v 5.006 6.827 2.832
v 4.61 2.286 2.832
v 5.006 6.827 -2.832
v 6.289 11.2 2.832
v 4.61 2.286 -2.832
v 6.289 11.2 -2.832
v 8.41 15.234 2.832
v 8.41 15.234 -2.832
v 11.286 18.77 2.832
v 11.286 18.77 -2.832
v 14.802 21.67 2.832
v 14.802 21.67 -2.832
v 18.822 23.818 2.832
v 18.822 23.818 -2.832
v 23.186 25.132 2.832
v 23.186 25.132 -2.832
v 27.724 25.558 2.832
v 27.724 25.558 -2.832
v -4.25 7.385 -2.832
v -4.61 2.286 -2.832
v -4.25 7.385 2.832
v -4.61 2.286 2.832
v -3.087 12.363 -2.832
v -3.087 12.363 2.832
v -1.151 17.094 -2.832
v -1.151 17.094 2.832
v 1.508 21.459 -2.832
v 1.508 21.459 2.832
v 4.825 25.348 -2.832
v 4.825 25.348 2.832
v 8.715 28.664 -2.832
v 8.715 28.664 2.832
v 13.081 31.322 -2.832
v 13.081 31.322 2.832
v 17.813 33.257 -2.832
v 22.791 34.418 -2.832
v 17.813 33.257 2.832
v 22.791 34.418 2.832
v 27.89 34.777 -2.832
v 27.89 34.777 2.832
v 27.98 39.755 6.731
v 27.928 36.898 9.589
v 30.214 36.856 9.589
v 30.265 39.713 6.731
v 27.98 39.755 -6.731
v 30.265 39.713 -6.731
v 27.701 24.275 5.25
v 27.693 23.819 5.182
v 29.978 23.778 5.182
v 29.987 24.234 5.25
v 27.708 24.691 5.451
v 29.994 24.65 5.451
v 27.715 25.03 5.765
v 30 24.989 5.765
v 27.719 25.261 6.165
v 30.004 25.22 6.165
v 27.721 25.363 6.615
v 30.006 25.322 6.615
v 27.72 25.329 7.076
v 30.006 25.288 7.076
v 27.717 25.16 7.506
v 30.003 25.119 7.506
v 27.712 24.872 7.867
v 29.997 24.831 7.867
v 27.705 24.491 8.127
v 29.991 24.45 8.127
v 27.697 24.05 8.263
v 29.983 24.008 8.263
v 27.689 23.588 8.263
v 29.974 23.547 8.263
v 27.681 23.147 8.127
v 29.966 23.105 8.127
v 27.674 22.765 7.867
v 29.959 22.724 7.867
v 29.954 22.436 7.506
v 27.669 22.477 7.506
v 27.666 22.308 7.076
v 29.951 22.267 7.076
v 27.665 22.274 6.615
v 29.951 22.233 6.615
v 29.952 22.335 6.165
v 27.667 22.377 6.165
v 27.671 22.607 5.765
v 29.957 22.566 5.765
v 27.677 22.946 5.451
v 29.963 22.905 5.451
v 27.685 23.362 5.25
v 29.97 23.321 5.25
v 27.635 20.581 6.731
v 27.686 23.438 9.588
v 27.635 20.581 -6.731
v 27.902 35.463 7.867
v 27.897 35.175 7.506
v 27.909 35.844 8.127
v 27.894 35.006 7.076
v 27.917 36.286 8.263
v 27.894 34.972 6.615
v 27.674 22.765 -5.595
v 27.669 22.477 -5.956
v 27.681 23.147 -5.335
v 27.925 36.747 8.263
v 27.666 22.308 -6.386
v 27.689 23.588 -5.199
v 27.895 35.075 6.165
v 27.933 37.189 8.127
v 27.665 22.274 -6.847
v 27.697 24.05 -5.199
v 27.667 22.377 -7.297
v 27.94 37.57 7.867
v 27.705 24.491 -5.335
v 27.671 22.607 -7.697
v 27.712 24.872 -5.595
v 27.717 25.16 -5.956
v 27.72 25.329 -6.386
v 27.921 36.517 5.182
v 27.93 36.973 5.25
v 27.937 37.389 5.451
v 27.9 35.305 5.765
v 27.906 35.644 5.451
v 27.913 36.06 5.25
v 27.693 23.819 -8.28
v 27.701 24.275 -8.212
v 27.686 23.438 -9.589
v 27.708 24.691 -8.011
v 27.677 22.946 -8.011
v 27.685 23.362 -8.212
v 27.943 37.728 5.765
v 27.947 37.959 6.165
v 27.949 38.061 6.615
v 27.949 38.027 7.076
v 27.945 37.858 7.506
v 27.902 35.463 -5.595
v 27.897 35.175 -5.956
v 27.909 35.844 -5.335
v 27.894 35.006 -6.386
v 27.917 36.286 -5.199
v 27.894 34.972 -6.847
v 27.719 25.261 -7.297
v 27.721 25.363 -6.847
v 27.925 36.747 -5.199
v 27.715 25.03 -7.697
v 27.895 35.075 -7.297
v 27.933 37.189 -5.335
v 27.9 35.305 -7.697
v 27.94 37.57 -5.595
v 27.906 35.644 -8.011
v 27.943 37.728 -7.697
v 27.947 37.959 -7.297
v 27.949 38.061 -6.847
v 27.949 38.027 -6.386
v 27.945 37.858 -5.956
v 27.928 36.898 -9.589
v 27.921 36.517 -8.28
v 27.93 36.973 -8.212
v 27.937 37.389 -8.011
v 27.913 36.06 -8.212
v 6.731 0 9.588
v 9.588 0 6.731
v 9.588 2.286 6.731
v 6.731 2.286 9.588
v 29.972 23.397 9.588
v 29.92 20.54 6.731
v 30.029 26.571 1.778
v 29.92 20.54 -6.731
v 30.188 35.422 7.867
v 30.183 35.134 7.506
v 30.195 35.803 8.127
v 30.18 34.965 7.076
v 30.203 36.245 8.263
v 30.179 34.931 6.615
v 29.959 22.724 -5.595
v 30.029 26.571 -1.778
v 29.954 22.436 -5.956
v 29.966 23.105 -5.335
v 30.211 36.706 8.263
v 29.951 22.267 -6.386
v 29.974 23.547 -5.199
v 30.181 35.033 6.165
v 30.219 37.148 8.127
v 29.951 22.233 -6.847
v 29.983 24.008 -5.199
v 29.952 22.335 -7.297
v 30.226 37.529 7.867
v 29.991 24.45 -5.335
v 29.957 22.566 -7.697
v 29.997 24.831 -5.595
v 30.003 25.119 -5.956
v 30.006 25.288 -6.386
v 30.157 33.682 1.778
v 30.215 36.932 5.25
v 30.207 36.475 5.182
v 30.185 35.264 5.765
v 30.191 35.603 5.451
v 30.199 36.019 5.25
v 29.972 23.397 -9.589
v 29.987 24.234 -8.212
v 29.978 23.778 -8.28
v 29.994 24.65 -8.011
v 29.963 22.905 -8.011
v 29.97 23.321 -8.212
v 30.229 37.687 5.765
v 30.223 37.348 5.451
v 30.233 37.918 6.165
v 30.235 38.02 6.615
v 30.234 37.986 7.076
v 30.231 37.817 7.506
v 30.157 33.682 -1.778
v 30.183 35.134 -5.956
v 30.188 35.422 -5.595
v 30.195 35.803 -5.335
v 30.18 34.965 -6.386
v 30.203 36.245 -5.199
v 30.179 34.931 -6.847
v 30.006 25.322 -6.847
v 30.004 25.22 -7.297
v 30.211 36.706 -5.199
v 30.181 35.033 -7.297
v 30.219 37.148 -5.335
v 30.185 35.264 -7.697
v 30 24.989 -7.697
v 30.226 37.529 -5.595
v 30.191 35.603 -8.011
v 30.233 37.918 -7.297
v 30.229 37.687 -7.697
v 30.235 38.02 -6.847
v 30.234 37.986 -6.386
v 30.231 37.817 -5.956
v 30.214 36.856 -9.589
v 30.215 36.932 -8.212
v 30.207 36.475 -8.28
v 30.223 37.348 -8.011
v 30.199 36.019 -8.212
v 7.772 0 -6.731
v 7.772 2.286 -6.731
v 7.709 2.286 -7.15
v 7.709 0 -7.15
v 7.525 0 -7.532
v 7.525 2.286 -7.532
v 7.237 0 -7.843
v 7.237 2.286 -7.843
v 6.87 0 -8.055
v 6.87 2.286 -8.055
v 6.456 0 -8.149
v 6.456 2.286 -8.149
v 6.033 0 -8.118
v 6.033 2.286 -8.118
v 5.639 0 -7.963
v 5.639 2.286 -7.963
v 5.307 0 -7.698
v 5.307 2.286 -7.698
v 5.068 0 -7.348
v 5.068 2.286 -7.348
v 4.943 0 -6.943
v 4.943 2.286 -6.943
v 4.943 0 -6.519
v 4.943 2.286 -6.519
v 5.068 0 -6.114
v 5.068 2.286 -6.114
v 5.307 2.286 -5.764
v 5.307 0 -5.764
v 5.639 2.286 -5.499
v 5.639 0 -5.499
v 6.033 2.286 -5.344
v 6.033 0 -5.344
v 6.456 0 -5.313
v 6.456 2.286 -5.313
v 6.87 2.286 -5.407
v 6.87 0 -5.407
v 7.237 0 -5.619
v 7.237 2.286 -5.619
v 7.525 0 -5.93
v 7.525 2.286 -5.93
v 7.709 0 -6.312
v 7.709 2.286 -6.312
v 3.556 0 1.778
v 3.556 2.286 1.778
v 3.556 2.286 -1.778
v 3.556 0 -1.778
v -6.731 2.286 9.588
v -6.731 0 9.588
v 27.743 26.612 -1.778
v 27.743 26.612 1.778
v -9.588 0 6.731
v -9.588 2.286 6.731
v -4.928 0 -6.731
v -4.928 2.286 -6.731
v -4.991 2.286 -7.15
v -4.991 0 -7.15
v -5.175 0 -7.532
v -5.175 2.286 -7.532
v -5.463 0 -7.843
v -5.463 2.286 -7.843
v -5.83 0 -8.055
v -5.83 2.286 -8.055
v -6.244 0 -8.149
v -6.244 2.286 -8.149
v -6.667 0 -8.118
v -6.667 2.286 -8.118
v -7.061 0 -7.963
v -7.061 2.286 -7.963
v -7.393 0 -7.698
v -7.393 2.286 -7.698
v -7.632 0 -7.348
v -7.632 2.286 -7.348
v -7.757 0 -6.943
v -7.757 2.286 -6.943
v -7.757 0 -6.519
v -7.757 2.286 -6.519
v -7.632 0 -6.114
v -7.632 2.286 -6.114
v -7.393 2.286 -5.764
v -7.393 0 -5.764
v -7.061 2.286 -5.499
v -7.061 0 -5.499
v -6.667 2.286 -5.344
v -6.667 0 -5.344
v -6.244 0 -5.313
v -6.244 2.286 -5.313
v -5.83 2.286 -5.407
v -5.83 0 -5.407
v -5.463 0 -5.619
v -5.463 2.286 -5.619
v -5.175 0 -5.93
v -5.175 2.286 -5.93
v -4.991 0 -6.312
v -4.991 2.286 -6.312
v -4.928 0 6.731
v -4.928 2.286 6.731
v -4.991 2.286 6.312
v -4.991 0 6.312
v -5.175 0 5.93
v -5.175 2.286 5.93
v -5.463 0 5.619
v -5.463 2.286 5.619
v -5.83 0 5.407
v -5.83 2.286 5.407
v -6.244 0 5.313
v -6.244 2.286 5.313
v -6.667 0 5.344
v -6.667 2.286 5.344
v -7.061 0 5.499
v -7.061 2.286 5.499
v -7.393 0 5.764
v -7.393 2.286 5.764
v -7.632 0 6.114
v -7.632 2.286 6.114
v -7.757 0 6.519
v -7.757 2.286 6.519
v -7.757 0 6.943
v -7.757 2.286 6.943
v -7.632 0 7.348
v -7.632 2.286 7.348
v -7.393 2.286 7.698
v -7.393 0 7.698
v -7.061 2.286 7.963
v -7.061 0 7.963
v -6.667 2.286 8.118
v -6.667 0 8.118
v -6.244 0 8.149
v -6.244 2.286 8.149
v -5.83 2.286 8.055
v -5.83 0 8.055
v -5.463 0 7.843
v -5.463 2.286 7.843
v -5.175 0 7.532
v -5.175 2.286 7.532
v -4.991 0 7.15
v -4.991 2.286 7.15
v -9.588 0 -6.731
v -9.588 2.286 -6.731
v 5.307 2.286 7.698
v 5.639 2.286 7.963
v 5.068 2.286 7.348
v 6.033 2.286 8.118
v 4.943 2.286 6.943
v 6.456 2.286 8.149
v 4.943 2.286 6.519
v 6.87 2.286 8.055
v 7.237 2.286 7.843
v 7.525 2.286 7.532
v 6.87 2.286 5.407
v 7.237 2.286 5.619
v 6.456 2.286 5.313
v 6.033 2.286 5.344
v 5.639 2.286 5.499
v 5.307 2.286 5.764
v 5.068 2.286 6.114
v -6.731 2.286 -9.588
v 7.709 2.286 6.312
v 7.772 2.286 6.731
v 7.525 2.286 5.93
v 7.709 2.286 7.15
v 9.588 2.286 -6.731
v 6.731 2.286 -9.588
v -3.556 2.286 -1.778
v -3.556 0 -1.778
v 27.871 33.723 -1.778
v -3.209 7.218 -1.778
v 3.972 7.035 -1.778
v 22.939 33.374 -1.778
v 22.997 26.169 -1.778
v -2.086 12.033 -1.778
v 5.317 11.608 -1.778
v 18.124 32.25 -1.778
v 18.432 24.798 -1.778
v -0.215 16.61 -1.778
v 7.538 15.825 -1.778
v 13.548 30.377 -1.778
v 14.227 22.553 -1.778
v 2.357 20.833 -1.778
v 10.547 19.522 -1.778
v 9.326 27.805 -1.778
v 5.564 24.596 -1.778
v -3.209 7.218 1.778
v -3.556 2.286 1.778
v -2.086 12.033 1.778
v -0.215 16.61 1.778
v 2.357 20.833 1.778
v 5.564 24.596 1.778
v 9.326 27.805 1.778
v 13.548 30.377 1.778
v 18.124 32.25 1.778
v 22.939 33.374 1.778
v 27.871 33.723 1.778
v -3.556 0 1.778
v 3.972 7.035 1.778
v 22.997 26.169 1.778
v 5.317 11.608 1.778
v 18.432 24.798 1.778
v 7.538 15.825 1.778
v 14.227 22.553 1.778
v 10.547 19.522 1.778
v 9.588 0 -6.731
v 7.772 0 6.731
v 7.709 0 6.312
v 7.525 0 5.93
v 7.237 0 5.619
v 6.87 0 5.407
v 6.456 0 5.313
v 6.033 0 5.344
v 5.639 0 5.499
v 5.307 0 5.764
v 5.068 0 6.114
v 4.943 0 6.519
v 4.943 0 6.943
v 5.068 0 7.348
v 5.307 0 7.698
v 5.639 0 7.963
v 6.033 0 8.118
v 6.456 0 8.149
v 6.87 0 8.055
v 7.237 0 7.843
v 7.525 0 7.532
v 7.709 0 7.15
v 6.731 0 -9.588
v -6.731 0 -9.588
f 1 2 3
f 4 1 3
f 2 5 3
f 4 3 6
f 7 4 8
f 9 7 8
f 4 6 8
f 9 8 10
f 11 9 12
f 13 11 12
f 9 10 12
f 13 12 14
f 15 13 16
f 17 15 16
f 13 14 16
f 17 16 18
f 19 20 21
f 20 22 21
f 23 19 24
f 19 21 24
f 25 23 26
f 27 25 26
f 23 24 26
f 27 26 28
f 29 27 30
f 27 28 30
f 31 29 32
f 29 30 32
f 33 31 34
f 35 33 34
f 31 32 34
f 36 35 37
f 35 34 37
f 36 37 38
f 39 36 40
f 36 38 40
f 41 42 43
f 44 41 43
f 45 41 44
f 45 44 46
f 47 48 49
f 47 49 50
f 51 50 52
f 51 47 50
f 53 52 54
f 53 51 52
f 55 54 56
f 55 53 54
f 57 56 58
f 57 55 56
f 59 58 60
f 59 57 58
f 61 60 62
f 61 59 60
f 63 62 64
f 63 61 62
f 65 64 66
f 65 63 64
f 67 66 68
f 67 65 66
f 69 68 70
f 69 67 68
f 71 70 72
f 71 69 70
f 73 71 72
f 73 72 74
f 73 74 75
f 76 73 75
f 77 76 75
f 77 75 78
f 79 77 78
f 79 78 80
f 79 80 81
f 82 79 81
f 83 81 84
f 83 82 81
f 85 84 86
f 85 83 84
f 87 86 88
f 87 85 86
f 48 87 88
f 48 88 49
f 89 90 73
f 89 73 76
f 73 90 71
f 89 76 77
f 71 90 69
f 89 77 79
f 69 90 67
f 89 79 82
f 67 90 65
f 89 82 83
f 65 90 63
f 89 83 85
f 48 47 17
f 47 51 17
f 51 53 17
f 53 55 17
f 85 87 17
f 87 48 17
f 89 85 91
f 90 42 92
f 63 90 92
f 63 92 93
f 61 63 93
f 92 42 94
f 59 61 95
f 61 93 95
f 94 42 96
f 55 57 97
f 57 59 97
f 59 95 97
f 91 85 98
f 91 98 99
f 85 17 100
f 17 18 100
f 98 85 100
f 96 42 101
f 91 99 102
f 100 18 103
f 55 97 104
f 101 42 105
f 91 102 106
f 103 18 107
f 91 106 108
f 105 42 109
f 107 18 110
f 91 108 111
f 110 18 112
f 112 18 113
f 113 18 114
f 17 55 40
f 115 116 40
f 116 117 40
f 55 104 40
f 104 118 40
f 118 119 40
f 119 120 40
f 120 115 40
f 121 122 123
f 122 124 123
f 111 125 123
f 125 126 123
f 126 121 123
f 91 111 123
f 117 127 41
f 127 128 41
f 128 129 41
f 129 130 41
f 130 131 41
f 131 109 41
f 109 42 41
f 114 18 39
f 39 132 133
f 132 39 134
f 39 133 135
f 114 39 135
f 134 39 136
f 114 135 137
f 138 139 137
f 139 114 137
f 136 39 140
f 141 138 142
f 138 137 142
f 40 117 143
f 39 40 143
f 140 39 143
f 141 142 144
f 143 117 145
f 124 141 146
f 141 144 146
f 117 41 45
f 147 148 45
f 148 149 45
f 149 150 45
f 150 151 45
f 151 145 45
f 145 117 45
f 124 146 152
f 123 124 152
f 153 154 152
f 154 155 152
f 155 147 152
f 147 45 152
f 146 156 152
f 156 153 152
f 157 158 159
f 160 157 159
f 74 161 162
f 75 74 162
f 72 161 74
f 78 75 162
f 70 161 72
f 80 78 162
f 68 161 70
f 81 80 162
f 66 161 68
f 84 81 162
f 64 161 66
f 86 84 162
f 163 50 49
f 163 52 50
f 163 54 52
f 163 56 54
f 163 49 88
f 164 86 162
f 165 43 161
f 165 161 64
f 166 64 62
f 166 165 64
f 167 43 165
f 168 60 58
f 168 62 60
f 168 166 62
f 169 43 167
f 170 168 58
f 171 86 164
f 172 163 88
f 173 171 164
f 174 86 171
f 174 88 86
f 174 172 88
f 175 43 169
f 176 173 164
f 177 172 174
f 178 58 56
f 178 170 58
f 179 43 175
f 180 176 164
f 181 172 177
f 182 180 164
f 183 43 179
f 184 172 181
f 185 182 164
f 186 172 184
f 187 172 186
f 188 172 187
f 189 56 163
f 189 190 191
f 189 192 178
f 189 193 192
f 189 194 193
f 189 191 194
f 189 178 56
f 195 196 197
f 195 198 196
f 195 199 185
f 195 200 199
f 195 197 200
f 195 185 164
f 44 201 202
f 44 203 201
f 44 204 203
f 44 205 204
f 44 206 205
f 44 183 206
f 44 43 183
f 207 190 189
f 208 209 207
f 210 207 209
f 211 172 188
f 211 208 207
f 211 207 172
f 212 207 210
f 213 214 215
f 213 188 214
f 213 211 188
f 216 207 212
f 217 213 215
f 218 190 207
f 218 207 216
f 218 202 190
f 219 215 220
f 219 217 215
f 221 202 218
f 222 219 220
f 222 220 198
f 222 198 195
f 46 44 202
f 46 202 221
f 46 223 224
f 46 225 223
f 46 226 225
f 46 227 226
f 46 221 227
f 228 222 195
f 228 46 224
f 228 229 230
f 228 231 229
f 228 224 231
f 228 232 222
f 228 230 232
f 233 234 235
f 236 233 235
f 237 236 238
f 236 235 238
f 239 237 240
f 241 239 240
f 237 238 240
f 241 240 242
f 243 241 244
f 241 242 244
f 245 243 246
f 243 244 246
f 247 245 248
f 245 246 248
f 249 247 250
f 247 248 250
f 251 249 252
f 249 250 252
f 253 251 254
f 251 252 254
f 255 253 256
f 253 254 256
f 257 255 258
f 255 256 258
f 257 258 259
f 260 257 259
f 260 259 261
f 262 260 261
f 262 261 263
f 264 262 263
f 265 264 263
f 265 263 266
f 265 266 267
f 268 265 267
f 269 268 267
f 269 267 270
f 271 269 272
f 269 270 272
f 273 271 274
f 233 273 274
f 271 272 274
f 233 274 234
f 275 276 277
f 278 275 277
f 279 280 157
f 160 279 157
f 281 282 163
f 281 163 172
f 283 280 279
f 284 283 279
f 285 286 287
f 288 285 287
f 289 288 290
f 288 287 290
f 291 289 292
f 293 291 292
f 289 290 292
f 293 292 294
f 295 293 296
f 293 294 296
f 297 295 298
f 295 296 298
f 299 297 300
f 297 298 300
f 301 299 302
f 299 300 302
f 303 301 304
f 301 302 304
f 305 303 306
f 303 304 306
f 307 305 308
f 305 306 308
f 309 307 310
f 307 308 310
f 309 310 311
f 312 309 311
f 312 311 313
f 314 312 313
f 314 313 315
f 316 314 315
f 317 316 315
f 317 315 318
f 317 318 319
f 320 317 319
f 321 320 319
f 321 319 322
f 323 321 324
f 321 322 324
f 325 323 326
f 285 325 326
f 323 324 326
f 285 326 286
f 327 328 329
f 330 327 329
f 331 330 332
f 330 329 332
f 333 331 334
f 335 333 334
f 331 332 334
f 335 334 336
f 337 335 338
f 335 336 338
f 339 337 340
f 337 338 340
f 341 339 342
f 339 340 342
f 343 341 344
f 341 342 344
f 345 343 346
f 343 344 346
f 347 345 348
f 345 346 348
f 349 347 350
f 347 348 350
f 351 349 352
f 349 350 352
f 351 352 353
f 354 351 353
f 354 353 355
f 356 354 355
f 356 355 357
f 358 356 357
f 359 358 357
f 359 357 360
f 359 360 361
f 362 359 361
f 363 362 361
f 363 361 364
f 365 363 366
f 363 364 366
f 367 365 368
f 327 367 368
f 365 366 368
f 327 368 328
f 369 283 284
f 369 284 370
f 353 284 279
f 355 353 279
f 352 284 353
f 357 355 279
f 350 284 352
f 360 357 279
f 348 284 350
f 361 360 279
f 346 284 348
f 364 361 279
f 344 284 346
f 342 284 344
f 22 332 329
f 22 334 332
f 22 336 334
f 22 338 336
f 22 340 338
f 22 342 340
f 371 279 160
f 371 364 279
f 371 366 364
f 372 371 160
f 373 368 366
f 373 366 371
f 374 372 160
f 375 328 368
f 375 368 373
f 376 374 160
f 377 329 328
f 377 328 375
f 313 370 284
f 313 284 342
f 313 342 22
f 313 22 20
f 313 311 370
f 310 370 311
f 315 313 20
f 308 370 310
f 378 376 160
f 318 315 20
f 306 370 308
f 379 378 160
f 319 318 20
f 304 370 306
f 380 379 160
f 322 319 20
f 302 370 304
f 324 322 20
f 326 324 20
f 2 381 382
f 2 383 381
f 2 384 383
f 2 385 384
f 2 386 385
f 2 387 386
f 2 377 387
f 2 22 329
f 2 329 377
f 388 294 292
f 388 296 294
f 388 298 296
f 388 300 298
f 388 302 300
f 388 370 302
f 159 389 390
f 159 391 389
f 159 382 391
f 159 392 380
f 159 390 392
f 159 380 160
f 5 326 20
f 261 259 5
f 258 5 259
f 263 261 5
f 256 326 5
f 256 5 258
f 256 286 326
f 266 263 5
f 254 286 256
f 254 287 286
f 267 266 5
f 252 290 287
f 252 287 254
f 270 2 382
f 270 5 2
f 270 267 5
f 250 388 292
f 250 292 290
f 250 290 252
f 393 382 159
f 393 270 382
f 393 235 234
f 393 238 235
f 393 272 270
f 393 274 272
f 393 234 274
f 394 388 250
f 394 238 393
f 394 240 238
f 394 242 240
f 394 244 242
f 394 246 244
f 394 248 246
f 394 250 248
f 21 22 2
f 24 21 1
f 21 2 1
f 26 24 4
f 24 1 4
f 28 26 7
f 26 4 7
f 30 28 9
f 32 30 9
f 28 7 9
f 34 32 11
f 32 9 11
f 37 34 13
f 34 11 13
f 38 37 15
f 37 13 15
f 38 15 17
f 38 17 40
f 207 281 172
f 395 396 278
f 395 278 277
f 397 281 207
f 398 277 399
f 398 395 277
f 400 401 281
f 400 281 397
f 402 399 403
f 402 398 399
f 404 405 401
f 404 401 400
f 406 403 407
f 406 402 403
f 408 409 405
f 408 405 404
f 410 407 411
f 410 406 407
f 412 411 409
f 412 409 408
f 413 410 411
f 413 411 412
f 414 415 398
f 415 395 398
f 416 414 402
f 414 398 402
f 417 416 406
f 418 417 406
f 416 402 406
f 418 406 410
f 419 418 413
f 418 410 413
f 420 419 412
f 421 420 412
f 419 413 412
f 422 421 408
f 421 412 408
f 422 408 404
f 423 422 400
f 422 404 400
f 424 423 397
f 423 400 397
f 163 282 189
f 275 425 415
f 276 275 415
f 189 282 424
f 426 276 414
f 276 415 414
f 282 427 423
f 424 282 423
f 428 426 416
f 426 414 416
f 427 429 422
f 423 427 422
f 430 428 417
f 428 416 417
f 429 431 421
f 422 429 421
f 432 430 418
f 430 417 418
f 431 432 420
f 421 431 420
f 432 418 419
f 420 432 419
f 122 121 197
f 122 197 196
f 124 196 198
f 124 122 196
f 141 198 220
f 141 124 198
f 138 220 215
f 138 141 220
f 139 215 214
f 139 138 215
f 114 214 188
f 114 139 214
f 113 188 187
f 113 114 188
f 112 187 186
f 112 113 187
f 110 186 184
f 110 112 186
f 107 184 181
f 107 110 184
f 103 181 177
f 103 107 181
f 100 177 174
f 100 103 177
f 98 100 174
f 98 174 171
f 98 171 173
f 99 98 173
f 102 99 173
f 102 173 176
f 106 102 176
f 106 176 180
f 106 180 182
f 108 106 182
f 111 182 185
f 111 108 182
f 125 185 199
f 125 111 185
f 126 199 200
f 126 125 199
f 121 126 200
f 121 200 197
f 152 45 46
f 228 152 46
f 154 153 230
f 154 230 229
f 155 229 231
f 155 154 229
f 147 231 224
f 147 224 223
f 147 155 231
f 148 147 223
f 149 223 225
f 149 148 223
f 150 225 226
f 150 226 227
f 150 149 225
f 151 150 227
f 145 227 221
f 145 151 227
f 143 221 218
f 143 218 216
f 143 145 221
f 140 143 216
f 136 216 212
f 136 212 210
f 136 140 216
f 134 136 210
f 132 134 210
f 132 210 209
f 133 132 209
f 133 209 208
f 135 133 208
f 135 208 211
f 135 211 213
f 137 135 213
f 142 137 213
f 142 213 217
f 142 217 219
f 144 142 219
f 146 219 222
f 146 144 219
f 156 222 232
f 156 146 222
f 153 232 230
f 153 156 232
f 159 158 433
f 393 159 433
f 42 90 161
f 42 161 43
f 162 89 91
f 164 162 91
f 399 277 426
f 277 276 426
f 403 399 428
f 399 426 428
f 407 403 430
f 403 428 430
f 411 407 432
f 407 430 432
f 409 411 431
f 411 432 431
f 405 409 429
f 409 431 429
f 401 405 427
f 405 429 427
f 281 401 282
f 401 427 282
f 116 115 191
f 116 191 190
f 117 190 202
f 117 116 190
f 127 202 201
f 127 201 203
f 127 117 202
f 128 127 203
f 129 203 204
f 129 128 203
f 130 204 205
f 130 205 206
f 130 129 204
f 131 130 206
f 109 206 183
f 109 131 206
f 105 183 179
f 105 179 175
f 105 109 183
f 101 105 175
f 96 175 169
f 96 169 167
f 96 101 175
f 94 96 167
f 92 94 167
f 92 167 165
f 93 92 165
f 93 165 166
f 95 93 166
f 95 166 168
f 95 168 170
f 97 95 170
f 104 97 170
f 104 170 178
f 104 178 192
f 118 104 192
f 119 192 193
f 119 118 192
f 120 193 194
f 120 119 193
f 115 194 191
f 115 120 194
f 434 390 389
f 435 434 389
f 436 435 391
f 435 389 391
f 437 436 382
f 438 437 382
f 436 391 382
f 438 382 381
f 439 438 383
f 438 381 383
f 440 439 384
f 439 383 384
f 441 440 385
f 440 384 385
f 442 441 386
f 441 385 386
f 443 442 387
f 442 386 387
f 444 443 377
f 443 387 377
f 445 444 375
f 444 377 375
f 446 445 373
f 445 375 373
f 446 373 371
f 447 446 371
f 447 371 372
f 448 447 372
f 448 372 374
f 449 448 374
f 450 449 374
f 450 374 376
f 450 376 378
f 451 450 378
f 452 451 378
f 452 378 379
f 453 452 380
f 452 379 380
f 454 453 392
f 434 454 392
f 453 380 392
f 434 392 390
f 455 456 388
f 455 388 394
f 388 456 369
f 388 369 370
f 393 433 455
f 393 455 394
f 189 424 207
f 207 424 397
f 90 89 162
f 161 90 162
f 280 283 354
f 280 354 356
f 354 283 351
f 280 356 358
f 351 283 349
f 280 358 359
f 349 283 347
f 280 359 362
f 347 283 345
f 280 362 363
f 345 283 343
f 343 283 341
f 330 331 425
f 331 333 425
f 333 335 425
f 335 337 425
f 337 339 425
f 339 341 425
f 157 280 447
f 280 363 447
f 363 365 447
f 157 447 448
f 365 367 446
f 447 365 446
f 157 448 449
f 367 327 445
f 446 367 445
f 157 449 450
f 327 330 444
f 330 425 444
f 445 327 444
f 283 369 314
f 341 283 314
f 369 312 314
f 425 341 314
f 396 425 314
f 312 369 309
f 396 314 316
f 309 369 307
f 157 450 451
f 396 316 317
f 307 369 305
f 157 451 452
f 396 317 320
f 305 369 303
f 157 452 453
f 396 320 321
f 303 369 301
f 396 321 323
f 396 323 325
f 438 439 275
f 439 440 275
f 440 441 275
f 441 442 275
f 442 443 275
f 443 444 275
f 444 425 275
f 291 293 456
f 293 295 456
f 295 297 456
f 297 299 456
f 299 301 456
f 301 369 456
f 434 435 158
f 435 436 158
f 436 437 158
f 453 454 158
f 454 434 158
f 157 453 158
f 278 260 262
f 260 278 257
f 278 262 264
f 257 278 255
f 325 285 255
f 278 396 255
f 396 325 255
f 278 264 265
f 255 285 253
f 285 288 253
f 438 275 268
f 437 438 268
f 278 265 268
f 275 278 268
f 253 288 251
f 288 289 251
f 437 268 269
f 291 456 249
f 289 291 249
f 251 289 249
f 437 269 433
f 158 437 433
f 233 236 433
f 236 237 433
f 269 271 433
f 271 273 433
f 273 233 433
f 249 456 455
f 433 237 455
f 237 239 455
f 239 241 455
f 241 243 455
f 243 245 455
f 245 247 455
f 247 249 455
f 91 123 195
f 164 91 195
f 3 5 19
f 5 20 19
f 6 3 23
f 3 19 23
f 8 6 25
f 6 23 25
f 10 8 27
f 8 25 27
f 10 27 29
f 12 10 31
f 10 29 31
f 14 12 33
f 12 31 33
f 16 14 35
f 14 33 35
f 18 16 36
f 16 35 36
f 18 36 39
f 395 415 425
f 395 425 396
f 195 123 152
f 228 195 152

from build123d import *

# Parameters (mm, degrees)
SKETCH1_W           = 19.177
SKETCH1_H           = 19.177
BOSS_EXTRUDE1_DEPTH = 2.286
SKETCH2_R           = 1.4224
SKETCH2_W           = 7.112
SKETCH2_H           = 3.556
CUT_EXTRUDE1_DEPTH  = 2.286
SKETCH3_W           = 9.2202
SKETCH3_H           = 5.6642
SKETCH3_W_2         = 7.112
SKETCH3_H_2         = 3.556
SKETCH5_W           = 19.177
SKETCH5_H           = 19.177
SKETCH5_R           = 1.5494
SKETCH5_W_2         = 3.556
SKETCH5_H_2         = 7.112
BOSS_EXTRUDE2_DEPTH = 2.286
CHAMFER1_SIZE       = 2.8575


with BuildPart() as part:
    # Sketch1 → Boss-Extrude1 (new body)
    with BuildSketch(Plane(origin=(0, 0, 0), x_dir=(1, 0, 0), z_dir=(0, 1, 0))):
        Rectangle(SKETCH1_W, SKETCH1_H)
    extrude(amount=BOSS_EXTRUDE1_DEPTH)

    # Sketch2 → Cut-Extrude1 (cut)
    with BuildSketch(Plane(origin=(0, 2.286, 0), x_dir=(1, 0, 0), z_dir=(0, 1, 0))):
        with Locations((-6.35, 6.731)):
            Circle(SKETCH2_R)
        with Locations((6.35, 6.731)):
            Circle(SKETCH2_R)
        with Locations((6.35, -6.731)):
            Circle(SKETCH2_R)
        with Locations((-6.35, -6.731)):
            Circle(SKETCH2_R)
        Rectangle(SKETCH2_W, SKETCH2_H)
    extrude(amount=-CUT_EXTRUDE1_DEPTH, mode=Mode.SUBTRACT)

    # Sweep1: sweep along a path in Sketch4
    with BuildLine(Plane.XY) as sweep1_path:
        ThreePointArc((4.6101, 2.286), (11.285803016, 18.770237549), (27.7241, 25.558277811))
    # Sketch3 → Sweep1 (sweep)
    with BuildSketch(Plane(origin=(0, 2.286, 0), x_dir=(1, 0, 0), z_dir=(0, 1, 0))):
        Rectangle(SKETCH3_W, SKETCH3_H)
        Rectangle(SKETCH3_W_2, SKETCH3_H_2, mode=Mode.SUBTRACT)
    sweep(path=sweep1_path.line)

    # Sketch5 → Boss-Extrude2 (add)
    with BuildSketch(Plane(origin=(27.255255403, -0.490558544, 0), x_dir=(0, 0, -1), z_dir=(0.999838063, -0.017995763, 0))):
        with Locations((0, 30.663155305)):
            Rectangle(SKETCH5_W, SKETCH5_H)
        with Locations((-6.731, 37.013155305)):
            Circle(SKETCH5_R, mode=Mode.SUBTRACT)
        with Locations((6.731, 37.013155305)):
            Circle(SKETCH5_R, mode=Mode.SUBTRACT)
        with Locations((-6.731, 24.313155305)):
            Circle(SKETCH5_R, mode=Mode.SUBTRACT)
        with Locations((6.731, 24.313155305)):
            Circle(SKETCH5_R, mode=Mode.SUBTRACT)
        with Locations((0, 30.663155305)):
            Rectangle(SKETCH5_W_2, SKETCH5_H_2, mode=Mode.SUBTRACT)
    extrude(amount=BOSS_EXTRUDE2_DEPTH)

    # Chamfer1
    chamfer1_edges = [part.edges().sort_by_distance(p)[0] for p in [
        (29.122429541, 39.734009377, 9.5885),
        (28.777324802, 20.56011484, 9.5885),
        (28.777324802, 20.56011484, -9.5885),
        (29.122429541, 39.734009377, -9.5885),
        (-9.5885, 1.143, -9.5885),
        (9.5885, 1.143, -9.5885),
        (9.5885, 1.143, 9.5885),
        (-9.5885, 1.143, 9.5885),
    ]]
    chamfer(chamfer1_edges, length=CHAMFER1_SIZE)


solid = part.part
